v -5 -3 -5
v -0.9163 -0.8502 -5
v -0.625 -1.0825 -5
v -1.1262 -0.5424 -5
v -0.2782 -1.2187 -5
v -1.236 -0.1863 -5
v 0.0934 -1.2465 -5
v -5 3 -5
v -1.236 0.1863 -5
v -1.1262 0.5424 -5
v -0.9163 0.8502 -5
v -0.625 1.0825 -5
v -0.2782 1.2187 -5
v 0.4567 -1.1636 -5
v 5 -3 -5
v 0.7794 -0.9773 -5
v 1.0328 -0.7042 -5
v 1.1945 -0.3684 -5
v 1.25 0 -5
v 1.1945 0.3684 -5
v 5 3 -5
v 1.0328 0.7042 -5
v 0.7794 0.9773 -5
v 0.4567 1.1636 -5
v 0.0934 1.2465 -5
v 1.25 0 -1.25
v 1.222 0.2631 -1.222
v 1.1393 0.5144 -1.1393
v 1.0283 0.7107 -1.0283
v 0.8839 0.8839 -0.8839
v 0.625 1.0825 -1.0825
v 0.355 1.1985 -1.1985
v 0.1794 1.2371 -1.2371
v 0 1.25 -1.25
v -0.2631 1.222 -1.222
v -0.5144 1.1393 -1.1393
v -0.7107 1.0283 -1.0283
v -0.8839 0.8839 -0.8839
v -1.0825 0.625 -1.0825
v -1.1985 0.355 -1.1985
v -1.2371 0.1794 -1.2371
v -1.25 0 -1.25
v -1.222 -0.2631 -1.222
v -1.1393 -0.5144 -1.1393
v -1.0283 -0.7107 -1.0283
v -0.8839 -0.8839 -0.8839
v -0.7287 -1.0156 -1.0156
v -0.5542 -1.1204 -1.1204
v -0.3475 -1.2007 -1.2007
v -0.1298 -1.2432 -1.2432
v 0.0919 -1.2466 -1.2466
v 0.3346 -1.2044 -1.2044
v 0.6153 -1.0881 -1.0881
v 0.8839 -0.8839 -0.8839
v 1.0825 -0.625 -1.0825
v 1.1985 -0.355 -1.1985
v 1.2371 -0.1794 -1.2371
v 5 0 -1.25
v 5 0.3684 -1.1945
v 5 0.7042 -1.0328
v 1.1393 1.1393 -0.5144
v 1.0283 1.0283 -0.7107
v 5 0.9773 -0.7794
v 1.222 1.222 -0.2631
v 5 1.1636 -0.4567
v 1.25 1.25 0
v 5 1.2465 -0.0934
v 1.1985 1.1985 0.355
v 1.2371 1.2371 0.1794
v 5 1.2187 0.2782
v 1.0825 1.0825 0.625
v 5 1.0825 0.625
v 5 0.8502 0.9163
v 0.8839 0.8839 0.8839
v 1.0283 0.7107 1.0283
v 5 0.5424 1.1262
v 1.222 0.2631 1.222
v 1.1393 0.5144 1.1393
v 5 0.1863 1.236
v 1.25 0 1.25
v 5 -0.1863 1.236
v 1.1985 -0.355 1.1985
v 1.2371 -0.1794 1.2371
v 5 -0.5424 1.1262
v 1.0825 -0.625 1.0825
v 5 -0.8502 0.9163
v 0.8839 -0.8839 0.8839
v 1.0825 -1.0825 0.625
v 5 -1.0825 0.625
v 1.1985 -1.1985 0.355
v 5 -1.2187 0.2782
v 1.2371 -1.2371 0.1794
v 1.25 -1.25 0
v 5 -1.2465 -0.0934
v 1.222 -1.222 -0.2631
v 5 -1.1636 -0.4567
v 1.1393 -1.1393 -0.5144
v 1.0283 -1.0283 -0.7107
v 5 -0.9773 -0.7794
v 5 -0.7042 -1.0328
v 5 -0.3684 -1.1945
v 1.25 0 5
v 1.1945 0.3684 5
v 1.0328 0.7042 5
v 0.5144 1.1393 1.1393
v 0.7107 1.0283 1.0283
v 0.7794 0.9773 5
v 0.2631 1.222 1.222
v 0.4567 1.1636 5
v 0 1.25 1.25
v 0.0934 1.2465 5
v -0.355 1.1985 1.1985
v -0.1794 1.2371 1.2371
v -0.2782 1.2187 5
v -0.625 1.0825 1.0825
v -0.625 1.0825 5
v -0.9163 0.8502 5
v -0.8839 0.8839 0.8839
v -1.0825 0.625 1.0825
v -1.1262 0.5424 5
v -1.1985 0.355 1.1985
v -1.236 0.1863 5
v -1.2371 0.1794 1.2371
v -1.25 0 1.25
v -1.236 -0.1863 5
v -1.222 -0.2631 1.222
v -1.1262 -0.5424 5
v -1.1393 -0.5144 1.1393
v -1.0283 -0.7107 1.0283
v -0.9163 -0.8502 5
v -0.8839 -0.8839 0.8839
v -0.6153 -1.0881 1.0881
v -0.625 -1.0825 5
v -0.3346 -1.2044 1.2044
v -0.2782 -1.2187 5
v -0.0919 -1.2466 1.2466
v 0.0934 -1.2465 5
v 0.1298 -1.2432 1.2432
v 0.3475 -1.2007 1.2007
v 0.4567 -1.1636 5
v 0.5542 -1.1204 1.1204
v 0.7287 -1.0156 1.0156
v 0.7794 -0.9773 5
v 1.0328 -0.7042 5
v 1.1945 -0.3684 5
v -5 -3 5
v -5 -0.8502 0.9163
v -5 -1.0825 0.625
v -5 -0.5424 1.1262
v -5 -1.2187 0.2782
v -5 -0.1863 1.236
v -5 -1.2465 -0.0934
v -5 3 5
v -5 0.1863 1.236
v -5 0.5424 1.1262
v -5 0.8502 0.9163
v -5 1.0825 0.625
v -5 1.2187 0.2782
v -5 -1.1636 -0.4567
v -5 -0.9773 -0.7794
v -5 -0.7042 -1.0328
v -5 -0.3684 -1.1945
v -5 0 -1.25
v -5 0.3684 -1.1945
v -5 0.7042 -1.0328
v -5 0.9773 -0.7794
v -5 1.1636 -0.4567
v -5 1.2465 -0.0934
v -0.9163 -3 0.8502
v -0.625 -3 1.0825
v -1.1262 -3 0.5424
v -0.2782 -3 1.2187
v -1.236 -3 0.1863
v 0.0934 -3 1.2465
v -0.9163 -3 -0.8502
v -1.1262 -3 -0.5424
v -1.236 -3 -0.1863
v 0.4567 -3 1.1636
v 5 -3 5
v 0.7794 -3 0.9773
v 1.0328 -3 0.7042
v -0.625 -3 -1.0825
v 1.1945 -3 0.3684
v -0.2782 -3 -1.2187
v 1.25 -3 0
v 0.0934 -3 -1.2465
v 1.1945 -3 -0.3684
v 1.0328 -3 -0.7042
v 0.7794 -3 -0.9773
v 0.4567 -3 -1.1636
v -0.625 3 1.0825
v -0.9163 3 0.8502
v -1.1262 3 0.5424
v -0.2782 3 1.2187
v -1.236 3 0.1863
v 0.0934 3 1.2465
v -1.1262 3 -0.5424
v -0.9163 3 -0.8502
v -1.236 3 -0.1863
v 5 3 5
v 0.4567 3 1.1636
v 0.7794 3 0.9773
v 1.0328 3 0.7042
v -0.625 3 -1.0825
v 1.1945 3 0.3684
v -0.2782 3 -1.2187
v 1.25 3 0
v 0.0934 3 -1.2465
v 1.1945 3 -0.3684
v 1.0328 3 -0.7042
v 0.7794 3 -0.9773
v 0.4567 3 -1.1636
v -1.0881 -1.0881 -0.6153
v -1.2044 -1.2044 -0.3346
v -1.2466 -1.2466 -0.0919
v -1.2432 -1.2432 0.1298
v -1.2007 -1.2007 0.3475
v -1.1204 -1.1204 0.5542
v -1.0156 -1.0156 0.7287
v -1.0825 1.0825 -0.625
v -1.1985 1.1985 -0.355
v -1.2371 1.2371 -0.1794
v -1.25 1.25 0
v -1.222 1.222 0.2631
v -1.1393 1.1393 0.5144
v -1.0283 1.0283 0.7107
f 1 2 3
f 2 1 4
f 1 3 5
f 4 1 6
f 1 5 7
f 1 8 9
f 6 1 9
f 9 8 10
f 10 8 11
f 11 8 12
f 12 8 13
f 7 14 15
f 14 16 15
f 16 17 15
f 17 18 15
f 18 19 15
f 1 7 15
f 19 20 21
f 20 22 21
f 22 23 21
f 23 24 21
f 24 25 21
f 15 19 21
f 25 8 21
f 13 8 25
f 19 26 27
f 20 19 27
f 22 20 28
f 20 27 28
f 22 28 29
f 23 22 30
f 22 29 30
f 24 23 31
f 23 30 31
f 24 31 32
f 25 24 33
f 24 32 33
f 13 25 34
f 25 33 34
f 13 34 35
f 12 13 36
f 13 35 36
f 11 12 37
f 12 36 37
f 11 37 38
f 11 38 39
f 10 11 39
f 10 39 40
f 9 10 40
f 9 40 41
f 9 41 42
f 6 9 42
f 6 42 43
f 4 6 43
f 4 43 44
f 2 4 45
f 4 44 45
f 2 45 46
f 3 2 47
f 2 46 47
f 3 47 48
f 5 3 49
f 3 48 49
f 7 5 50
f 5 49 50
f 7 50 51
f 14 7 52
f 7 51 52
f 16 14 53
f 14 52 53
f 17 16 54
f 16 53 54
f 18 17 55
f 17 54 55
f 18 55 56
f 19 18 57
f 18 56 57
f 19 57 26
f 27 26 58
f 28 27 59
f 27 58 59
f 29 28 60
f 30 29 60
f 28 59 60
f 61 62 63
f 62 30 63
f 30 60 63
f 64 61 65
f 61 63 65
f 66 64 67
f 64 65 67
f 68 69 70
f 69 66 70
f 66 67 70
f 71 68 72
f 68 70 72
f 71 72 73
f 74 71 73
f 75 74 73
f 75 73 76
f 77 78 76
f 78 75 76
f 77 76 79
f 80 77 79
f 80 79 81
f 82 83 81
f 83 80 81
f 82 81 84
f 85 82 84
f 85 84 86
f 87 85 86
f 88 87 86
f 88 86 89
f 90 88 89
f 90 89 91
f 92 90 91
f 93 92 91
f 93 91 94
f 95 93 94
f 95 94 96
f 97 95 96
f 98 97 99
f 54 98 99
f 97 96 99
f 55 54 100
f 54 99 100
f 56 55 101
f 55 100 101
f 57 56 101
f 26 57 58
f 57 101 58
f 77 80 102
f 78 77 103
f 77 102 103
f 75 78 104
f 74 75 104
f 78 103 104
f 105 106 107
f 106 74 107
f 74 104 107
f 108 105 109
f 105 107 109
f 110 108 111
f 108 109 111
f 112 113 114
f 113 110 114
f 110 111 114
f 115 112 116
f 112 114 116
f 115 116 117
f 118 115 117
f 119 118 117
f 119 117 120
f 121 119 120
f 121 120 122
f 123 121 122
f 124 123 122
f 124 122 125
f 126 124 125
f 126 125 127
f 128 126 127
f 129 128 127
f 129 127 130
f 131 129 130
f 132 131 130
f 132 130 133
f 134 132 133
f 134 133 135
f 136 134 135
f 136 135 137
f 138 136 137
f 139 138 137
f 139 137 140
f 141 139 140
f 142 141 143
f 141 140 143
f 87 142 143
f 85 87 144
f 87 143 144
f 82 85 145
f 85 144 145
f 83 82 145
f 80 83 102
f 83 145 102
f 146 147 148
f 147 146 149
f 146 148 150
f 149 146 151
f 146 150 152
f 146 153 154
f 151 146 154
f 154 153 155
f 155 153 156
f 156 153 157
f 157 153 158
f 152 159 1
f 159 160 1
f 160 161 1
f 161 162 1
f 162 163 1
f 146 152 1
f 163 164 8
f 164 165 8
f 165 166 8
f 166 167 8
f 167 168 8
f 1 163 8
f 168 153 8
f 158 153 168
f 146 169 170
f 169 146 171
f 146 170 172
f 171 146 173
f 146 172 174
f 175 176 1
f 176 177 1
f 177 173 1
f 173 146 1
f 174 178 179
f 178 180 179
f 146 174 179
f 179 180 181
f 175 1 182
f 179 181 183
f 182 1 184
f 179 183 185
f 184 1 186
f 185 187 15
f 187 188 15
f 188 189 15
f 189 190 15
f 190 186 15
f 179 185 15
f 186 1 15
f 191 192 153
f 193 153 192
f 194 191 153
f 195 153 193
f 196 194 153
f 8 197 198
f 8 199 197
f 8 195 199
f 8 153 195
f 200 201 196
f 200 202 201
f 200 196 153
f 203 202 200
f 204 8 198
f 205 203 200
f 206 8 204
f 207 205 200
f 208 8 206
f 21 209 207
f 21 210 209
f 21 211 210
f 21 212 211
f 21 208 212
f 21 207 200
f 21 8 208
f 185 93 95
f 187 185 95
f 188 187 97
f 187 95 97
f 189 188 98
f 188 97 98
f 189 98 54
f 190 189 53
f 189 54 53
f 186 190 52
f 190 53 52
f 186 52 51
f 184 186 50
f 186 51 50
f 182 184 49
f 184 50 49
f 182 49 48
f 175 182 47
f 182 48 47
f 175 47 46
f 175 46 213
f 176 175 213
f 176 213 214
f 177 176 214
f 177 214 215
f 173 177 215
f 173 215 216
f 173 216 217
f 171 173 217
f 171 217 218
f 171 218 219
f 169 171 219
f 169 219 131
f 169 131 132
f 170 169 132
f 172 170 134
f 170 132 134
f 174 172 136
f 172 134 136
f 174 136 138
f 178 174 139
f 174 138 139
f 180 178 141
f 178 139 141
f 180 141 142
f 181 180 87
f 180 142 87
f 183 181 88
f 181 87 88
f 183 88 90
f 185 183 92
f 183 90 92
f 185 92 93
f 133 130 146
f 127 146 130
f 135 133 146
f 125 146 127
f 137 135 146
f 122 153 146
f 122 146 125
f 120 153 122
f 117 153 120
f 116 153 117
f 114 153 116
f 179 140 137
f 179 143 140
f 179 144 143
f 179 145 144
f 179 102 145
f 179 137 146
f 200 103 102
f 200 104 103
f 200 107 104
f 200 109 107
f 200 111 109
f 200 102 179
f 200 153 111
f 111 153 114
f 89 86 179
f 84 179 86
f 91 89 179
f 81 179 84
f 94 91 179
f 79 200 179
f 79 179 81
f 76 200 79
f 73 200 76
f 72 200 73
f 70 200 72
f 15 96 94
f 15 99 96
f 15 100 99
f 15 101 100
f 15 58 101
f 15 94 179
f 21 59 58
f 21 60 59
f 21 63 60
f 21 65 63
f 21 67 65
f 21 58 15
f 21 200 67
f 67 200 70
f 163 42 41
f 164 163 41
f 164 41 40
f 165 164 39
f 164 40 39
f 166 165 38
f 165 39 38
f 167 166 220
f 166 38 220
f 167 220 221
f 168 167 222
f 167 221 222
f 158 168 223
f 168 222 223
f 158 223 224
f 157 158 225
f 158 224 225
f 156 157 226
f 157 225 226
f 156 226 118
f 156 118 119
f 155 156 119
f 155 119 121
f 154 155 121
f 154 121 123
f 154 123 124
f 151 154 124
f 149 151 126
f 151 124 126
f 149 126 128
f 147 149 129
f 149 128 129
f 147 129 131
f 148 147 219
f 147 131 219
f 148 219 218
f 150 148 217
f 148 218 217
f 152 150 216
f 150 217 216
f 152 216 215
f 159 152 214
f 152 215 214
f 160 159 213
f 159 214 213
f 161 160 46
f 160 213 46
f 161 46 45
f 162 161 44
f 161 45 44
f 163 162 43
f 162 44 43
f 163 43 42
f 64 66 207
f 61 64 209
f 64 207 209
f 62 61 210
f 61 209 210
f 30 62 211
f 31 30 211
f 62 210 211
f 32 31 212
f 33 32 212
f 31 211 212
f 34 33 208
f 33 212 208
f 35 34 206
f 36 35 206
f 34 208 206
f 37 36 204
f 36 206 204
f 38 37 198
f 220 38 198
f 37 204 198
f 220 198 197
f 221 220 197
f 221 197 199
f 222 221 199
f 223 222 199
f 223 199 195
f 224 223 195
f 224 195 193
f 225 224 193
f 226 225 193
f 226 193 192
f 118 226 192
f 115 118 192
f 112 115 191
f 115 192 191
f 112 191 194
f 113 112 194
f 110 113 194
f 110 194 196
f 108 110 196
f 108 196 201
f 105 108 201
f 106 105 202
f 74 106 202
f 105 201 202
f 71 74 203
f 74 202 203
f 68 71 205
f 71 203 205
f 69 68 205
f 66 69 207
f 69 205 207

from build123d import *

# Parameters (mm, degrees)
SKETCH_1_W          = 10
SKETCH_1_H          = 10
EXTRUDE_1_DEPTH     = 3
SKETCH_2_R          = 1.25
CUT_EXTRUDE_1_DEPTH = 7
SKETCH_3_R          = 1.25
CUT_EXTRUDE_2_DEPTH = 11
SKETCH_4_R          = 1.25
CUT_EXTRUDE_3_DEPTH = 11


with BuildPart() as part:
    # 草圖1 → 填料-伸長1 (new body, symmetric)
    with BuildSketch(Plane(origin=(0, 0, 0), x_dir=(1, 0, 0), z_dir=(0, 1, 0))):
        Rectangle(SKETCH_1_W, SKETCH_1_H)
    extrude(amount=EXTRUDE_1_DEPTH, both=True)

    # 草圖2 → 除料-伸長1 (cut, through all)
    with BuildSketch(Plane(origin=(0, 3, 0), x_dir=(1, 0, 0), z_dir=(0, 1, 0))):
        Circle(SKETCH_2_R)
    extrude(amount=-CUT_EXTRUDE_1_DEPTH, mode=Mode.SUBTRACT)

    # 草圖3 → 除料-伸長2 (cut, through all)
    with BuildSketch(Plane.XY.offset(5)):
        Circle(SKETCH_3_R)
    extrude(amount=-CUT_EXTRUDE_2_DEPTH, mode=Mode.SUBTRACT)

    # 草圖4 → 除料-伸長3 (cut, through all)
    with BuildSketch(Plane(origin=(5, 0, 0), x_dir=(0, 0, -1), z_dir=(1, 0, 0))):
        Circle(SKETCH_4_R)
    extrude(amount=-CUT_EXTRUDE_3_DEPTH, mode=Mode.SUBTRACT)


solid = part.part
